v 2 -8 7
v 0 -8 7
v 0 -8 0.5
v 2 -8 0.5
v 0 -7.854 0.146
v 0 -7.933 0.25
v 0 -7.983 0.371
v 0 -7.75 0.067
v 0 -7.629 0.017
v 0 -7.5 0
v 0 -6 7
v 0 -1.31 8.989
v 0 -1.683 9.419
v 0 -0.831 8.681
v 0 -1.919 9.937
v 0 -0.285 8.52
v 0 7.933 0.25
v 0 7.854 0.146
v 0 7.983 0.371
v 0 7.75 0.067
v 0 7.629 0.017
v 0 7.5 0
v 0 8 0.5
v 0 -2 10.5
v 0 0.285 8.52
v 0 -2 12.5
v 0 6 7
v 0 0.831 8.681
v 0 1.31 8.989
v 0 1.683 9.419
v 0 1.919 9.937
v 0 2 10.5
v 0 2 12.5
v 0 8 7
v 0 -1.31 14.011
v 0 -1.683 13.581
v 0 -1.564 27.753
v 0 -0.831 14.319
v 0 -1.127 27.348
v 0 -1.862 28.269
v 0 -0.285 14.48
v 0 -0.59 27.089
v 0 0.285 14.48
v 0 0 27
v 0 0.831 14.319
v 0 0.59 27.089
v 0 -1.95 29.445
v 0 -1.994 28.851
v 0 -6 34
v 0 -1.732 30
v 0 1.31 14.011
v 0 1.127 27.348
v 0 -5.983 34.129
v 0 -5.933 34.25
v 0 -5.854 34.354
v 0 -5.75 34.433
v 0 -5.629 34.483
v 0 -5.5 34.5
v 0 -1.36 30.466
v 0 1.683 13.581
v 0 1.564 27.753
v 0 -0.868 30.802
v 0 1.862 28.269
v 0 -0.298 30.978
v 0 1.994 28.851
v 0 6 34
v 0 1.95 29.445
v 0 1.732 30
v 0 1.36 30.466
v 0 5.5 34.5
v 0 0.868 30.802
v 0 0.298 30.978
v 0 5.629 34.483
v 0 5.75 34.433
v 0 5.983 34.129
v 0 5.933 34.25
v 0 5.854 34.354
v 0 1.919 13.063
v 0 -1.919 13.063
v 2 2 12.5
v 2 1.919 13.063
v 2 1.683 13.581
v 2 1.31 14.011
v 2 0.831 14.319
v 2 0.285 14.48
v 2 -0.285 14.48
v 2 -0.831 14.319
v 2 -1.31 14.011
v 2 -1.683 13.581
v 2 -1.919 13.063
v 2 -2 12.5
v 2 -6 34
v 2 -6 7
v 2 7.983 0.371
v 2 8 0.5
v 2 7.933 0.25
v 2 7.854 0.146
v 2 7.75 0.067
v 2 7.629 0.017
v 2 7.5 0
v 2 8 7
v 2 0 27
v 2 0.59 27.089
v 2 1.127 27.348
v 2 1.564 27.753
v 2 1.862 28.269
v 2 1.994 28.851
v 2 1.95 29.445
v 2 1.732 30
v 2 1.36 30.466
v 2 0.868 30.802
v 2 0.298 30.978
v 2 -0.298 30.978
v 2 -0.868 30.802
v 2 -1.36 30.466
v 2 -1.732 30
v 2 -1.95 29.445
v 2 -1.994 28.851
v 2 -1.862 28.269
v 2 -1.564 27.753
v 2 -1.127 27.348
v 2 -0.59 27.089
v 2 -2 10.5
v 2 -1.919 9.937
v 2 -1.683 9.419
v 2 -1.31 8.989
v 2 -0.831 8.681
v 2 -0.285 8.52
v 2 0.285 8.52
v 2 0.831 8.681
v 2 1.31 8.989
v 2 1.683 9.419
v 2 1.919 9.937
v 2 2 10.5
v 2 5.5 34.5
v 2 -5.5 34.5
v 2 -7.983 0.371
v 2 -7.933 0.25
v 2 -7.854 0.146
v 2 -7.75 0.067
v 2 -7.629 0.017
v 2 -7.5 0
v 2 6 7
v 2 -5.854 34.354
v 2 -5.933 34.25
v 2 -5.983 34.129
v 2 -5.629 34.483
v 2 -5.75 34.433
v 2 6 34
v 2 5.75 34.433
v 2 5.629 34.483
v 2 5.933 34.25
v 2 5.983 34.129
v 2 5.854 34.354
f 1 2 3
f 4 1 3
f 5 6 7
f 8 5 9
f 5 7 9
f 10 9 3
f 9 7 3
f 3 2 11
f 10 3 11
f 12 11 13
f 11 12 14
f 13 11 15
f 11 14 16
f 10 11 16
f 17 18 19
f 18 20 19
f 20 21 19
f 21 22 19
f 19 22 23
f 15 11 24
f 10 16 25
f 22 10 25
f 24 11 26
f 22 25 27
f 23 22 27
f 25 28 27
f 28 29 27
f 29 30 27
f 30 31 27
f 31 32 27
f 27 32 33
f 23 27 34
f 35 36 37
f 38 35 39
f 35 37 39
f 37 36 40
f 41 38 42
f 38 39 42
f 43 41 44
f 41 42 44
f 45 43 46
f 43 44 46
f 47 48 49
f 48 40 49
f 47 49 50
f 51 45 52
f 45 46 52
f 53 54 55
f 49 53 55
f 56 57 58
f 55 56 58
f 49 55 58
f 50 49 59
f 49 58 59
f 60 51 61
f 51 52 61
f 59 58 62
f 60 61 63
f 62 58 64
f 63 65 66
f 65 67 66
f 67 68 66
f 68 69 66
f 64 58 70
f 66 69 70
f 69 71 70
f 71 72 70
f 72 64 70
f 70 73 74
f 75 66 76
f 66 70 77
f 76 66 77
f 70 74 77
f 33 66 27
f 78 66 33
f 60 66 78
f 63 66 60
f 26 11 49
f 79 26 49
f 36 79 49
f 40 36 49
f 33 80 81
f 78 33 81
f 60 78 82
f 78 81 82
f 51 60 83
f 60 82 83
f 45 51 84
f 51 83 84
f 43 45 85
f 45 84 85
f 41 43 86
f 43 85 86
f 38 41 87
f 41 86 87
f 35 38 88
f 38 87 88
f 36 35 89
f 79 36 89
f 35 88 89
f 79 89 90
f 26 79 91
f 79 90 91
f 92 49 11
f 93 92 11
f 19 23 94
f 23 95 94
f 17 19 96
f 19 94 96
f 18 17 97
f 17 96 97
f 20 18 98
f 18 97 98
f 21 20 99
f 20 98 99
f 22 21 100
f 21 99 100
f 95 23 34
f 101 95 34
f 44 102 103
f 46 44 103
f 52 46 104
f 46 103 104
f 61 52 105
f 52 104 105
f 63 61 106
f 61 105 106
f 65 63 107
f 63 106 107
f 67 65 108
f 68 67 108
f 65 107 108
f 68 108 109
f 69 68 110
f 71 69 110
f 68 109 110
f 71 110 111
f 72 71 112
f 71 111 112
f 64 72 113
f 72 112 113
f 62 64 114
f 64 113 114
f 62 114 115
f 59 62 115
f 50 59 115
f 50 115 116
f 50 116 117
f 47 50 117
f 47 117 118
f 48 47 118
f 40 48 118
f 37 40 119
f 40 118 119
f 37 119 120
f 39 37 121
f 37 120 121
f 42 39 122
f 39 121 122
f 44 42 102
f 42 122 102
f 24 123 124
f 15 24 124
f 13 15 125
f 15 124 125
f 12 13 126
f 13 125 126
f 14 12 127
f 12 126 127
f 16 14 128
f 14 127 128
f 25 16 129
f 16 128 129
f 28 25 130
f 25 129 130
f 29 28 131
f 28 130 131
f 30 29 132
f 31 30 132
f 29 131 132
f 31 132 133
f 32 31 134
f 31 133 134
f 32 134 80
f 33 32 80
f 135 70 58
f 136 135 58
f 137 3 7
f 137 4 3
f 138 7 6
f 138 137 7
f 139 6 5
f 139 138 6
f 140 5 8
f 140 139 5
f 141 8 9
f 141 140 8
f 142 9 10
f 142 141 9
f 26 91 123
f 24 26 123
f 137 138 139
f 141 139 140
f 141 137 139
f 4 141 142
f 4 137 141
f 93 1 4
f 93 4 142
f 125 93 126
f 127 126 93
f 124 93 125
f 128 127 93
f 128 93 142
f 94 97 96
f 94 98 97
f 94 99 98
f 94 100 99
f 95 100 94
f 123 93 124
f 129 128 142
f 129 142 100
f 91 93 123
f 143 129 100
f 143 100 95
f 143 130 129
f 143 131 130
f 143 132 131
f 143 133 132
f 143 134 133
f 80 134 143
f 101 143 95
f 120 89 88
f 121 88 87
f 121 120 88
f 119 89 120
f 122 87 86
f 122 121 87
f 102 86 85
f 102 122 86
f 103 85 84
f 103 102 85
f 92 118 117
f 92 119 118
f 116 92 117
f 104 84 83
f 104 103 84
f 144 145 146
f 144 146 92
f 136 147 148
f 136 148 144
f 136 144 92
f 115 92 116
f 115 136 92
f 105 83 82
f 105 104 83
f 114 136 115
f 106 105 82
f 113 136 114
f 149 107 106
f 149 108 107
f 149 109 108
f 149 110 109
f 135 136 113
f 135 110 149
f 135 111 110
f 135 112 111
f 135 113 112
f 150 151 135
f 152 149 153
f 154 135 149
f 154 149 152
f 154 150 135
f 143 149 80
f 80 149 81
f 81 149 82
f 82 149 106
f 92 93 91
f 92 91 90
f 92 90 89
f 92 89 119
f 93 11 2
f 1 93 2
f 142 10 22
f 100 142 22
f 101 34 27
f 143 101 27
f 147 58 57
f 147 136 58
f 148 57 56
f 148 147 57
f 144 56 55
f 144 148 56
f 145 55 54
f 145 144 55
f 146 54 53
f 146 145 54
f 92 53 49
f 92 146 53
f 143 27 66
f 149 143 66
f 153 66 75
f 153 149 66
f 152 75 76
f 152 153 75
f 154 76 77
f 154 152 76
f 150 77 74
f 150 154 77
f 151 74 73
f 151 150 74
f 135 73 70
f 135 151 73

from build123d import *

# Parameters (mm, degrees)
BOSS_EXTRUDE1_DEPTH = 2
FILLET1_R           = 0.5
SKETCH2_R           = 2
CUT_EXTRUDE1_DEPTH  = 2


with BuildPart() as part:
    # Sketch1 → Boss-Extrude1 (new body)
    with BuildSketch(Plane.YZ):
        Polygon((0, 0), (8, 0), (8, 7), (6, 7), (6, 34.5), (-6, 34.5), (-6, 7), (-8, 7), (-8, 0), align=None)
    extrude(amount=BOSS_EXTRUDE1_DEPTH)

    # Fillet1
    fillet1_edges = [part.edges().sort_by_distance(p)[0] for p in [
        (1, 6, 34.5),
        (1, 8, 0),
        (1, -8, 0),
        (1, -6, 34.5),
    ]]
    fillet(fillet1_edges, radius=FILLET1_R)

    # Sketch2 → Cut-Extrude1 (cut)
    with BuildSketch(Plane.YZ.offset(2)):
        with Locations(Location((0, 29, 0), (0, 0, 270))):
            Circle(SKETCH2_R)
        with BuildLine():
            Line((-2, 12.5), (-2, 10.5))
            ThreePointArc((-2, 10.5), (0, 8.5), (2, 10.5))
            Line((2, 10.5), (2, 12.5))
            ThreePointArc((2, 12.5), (0, 14.5), (-2, 12.5))
        make_face()
    extrude(amount=-CUT_EXTRUDE1_DEPTH, mode=Mode.SUBTRACT)


solid = part.part
